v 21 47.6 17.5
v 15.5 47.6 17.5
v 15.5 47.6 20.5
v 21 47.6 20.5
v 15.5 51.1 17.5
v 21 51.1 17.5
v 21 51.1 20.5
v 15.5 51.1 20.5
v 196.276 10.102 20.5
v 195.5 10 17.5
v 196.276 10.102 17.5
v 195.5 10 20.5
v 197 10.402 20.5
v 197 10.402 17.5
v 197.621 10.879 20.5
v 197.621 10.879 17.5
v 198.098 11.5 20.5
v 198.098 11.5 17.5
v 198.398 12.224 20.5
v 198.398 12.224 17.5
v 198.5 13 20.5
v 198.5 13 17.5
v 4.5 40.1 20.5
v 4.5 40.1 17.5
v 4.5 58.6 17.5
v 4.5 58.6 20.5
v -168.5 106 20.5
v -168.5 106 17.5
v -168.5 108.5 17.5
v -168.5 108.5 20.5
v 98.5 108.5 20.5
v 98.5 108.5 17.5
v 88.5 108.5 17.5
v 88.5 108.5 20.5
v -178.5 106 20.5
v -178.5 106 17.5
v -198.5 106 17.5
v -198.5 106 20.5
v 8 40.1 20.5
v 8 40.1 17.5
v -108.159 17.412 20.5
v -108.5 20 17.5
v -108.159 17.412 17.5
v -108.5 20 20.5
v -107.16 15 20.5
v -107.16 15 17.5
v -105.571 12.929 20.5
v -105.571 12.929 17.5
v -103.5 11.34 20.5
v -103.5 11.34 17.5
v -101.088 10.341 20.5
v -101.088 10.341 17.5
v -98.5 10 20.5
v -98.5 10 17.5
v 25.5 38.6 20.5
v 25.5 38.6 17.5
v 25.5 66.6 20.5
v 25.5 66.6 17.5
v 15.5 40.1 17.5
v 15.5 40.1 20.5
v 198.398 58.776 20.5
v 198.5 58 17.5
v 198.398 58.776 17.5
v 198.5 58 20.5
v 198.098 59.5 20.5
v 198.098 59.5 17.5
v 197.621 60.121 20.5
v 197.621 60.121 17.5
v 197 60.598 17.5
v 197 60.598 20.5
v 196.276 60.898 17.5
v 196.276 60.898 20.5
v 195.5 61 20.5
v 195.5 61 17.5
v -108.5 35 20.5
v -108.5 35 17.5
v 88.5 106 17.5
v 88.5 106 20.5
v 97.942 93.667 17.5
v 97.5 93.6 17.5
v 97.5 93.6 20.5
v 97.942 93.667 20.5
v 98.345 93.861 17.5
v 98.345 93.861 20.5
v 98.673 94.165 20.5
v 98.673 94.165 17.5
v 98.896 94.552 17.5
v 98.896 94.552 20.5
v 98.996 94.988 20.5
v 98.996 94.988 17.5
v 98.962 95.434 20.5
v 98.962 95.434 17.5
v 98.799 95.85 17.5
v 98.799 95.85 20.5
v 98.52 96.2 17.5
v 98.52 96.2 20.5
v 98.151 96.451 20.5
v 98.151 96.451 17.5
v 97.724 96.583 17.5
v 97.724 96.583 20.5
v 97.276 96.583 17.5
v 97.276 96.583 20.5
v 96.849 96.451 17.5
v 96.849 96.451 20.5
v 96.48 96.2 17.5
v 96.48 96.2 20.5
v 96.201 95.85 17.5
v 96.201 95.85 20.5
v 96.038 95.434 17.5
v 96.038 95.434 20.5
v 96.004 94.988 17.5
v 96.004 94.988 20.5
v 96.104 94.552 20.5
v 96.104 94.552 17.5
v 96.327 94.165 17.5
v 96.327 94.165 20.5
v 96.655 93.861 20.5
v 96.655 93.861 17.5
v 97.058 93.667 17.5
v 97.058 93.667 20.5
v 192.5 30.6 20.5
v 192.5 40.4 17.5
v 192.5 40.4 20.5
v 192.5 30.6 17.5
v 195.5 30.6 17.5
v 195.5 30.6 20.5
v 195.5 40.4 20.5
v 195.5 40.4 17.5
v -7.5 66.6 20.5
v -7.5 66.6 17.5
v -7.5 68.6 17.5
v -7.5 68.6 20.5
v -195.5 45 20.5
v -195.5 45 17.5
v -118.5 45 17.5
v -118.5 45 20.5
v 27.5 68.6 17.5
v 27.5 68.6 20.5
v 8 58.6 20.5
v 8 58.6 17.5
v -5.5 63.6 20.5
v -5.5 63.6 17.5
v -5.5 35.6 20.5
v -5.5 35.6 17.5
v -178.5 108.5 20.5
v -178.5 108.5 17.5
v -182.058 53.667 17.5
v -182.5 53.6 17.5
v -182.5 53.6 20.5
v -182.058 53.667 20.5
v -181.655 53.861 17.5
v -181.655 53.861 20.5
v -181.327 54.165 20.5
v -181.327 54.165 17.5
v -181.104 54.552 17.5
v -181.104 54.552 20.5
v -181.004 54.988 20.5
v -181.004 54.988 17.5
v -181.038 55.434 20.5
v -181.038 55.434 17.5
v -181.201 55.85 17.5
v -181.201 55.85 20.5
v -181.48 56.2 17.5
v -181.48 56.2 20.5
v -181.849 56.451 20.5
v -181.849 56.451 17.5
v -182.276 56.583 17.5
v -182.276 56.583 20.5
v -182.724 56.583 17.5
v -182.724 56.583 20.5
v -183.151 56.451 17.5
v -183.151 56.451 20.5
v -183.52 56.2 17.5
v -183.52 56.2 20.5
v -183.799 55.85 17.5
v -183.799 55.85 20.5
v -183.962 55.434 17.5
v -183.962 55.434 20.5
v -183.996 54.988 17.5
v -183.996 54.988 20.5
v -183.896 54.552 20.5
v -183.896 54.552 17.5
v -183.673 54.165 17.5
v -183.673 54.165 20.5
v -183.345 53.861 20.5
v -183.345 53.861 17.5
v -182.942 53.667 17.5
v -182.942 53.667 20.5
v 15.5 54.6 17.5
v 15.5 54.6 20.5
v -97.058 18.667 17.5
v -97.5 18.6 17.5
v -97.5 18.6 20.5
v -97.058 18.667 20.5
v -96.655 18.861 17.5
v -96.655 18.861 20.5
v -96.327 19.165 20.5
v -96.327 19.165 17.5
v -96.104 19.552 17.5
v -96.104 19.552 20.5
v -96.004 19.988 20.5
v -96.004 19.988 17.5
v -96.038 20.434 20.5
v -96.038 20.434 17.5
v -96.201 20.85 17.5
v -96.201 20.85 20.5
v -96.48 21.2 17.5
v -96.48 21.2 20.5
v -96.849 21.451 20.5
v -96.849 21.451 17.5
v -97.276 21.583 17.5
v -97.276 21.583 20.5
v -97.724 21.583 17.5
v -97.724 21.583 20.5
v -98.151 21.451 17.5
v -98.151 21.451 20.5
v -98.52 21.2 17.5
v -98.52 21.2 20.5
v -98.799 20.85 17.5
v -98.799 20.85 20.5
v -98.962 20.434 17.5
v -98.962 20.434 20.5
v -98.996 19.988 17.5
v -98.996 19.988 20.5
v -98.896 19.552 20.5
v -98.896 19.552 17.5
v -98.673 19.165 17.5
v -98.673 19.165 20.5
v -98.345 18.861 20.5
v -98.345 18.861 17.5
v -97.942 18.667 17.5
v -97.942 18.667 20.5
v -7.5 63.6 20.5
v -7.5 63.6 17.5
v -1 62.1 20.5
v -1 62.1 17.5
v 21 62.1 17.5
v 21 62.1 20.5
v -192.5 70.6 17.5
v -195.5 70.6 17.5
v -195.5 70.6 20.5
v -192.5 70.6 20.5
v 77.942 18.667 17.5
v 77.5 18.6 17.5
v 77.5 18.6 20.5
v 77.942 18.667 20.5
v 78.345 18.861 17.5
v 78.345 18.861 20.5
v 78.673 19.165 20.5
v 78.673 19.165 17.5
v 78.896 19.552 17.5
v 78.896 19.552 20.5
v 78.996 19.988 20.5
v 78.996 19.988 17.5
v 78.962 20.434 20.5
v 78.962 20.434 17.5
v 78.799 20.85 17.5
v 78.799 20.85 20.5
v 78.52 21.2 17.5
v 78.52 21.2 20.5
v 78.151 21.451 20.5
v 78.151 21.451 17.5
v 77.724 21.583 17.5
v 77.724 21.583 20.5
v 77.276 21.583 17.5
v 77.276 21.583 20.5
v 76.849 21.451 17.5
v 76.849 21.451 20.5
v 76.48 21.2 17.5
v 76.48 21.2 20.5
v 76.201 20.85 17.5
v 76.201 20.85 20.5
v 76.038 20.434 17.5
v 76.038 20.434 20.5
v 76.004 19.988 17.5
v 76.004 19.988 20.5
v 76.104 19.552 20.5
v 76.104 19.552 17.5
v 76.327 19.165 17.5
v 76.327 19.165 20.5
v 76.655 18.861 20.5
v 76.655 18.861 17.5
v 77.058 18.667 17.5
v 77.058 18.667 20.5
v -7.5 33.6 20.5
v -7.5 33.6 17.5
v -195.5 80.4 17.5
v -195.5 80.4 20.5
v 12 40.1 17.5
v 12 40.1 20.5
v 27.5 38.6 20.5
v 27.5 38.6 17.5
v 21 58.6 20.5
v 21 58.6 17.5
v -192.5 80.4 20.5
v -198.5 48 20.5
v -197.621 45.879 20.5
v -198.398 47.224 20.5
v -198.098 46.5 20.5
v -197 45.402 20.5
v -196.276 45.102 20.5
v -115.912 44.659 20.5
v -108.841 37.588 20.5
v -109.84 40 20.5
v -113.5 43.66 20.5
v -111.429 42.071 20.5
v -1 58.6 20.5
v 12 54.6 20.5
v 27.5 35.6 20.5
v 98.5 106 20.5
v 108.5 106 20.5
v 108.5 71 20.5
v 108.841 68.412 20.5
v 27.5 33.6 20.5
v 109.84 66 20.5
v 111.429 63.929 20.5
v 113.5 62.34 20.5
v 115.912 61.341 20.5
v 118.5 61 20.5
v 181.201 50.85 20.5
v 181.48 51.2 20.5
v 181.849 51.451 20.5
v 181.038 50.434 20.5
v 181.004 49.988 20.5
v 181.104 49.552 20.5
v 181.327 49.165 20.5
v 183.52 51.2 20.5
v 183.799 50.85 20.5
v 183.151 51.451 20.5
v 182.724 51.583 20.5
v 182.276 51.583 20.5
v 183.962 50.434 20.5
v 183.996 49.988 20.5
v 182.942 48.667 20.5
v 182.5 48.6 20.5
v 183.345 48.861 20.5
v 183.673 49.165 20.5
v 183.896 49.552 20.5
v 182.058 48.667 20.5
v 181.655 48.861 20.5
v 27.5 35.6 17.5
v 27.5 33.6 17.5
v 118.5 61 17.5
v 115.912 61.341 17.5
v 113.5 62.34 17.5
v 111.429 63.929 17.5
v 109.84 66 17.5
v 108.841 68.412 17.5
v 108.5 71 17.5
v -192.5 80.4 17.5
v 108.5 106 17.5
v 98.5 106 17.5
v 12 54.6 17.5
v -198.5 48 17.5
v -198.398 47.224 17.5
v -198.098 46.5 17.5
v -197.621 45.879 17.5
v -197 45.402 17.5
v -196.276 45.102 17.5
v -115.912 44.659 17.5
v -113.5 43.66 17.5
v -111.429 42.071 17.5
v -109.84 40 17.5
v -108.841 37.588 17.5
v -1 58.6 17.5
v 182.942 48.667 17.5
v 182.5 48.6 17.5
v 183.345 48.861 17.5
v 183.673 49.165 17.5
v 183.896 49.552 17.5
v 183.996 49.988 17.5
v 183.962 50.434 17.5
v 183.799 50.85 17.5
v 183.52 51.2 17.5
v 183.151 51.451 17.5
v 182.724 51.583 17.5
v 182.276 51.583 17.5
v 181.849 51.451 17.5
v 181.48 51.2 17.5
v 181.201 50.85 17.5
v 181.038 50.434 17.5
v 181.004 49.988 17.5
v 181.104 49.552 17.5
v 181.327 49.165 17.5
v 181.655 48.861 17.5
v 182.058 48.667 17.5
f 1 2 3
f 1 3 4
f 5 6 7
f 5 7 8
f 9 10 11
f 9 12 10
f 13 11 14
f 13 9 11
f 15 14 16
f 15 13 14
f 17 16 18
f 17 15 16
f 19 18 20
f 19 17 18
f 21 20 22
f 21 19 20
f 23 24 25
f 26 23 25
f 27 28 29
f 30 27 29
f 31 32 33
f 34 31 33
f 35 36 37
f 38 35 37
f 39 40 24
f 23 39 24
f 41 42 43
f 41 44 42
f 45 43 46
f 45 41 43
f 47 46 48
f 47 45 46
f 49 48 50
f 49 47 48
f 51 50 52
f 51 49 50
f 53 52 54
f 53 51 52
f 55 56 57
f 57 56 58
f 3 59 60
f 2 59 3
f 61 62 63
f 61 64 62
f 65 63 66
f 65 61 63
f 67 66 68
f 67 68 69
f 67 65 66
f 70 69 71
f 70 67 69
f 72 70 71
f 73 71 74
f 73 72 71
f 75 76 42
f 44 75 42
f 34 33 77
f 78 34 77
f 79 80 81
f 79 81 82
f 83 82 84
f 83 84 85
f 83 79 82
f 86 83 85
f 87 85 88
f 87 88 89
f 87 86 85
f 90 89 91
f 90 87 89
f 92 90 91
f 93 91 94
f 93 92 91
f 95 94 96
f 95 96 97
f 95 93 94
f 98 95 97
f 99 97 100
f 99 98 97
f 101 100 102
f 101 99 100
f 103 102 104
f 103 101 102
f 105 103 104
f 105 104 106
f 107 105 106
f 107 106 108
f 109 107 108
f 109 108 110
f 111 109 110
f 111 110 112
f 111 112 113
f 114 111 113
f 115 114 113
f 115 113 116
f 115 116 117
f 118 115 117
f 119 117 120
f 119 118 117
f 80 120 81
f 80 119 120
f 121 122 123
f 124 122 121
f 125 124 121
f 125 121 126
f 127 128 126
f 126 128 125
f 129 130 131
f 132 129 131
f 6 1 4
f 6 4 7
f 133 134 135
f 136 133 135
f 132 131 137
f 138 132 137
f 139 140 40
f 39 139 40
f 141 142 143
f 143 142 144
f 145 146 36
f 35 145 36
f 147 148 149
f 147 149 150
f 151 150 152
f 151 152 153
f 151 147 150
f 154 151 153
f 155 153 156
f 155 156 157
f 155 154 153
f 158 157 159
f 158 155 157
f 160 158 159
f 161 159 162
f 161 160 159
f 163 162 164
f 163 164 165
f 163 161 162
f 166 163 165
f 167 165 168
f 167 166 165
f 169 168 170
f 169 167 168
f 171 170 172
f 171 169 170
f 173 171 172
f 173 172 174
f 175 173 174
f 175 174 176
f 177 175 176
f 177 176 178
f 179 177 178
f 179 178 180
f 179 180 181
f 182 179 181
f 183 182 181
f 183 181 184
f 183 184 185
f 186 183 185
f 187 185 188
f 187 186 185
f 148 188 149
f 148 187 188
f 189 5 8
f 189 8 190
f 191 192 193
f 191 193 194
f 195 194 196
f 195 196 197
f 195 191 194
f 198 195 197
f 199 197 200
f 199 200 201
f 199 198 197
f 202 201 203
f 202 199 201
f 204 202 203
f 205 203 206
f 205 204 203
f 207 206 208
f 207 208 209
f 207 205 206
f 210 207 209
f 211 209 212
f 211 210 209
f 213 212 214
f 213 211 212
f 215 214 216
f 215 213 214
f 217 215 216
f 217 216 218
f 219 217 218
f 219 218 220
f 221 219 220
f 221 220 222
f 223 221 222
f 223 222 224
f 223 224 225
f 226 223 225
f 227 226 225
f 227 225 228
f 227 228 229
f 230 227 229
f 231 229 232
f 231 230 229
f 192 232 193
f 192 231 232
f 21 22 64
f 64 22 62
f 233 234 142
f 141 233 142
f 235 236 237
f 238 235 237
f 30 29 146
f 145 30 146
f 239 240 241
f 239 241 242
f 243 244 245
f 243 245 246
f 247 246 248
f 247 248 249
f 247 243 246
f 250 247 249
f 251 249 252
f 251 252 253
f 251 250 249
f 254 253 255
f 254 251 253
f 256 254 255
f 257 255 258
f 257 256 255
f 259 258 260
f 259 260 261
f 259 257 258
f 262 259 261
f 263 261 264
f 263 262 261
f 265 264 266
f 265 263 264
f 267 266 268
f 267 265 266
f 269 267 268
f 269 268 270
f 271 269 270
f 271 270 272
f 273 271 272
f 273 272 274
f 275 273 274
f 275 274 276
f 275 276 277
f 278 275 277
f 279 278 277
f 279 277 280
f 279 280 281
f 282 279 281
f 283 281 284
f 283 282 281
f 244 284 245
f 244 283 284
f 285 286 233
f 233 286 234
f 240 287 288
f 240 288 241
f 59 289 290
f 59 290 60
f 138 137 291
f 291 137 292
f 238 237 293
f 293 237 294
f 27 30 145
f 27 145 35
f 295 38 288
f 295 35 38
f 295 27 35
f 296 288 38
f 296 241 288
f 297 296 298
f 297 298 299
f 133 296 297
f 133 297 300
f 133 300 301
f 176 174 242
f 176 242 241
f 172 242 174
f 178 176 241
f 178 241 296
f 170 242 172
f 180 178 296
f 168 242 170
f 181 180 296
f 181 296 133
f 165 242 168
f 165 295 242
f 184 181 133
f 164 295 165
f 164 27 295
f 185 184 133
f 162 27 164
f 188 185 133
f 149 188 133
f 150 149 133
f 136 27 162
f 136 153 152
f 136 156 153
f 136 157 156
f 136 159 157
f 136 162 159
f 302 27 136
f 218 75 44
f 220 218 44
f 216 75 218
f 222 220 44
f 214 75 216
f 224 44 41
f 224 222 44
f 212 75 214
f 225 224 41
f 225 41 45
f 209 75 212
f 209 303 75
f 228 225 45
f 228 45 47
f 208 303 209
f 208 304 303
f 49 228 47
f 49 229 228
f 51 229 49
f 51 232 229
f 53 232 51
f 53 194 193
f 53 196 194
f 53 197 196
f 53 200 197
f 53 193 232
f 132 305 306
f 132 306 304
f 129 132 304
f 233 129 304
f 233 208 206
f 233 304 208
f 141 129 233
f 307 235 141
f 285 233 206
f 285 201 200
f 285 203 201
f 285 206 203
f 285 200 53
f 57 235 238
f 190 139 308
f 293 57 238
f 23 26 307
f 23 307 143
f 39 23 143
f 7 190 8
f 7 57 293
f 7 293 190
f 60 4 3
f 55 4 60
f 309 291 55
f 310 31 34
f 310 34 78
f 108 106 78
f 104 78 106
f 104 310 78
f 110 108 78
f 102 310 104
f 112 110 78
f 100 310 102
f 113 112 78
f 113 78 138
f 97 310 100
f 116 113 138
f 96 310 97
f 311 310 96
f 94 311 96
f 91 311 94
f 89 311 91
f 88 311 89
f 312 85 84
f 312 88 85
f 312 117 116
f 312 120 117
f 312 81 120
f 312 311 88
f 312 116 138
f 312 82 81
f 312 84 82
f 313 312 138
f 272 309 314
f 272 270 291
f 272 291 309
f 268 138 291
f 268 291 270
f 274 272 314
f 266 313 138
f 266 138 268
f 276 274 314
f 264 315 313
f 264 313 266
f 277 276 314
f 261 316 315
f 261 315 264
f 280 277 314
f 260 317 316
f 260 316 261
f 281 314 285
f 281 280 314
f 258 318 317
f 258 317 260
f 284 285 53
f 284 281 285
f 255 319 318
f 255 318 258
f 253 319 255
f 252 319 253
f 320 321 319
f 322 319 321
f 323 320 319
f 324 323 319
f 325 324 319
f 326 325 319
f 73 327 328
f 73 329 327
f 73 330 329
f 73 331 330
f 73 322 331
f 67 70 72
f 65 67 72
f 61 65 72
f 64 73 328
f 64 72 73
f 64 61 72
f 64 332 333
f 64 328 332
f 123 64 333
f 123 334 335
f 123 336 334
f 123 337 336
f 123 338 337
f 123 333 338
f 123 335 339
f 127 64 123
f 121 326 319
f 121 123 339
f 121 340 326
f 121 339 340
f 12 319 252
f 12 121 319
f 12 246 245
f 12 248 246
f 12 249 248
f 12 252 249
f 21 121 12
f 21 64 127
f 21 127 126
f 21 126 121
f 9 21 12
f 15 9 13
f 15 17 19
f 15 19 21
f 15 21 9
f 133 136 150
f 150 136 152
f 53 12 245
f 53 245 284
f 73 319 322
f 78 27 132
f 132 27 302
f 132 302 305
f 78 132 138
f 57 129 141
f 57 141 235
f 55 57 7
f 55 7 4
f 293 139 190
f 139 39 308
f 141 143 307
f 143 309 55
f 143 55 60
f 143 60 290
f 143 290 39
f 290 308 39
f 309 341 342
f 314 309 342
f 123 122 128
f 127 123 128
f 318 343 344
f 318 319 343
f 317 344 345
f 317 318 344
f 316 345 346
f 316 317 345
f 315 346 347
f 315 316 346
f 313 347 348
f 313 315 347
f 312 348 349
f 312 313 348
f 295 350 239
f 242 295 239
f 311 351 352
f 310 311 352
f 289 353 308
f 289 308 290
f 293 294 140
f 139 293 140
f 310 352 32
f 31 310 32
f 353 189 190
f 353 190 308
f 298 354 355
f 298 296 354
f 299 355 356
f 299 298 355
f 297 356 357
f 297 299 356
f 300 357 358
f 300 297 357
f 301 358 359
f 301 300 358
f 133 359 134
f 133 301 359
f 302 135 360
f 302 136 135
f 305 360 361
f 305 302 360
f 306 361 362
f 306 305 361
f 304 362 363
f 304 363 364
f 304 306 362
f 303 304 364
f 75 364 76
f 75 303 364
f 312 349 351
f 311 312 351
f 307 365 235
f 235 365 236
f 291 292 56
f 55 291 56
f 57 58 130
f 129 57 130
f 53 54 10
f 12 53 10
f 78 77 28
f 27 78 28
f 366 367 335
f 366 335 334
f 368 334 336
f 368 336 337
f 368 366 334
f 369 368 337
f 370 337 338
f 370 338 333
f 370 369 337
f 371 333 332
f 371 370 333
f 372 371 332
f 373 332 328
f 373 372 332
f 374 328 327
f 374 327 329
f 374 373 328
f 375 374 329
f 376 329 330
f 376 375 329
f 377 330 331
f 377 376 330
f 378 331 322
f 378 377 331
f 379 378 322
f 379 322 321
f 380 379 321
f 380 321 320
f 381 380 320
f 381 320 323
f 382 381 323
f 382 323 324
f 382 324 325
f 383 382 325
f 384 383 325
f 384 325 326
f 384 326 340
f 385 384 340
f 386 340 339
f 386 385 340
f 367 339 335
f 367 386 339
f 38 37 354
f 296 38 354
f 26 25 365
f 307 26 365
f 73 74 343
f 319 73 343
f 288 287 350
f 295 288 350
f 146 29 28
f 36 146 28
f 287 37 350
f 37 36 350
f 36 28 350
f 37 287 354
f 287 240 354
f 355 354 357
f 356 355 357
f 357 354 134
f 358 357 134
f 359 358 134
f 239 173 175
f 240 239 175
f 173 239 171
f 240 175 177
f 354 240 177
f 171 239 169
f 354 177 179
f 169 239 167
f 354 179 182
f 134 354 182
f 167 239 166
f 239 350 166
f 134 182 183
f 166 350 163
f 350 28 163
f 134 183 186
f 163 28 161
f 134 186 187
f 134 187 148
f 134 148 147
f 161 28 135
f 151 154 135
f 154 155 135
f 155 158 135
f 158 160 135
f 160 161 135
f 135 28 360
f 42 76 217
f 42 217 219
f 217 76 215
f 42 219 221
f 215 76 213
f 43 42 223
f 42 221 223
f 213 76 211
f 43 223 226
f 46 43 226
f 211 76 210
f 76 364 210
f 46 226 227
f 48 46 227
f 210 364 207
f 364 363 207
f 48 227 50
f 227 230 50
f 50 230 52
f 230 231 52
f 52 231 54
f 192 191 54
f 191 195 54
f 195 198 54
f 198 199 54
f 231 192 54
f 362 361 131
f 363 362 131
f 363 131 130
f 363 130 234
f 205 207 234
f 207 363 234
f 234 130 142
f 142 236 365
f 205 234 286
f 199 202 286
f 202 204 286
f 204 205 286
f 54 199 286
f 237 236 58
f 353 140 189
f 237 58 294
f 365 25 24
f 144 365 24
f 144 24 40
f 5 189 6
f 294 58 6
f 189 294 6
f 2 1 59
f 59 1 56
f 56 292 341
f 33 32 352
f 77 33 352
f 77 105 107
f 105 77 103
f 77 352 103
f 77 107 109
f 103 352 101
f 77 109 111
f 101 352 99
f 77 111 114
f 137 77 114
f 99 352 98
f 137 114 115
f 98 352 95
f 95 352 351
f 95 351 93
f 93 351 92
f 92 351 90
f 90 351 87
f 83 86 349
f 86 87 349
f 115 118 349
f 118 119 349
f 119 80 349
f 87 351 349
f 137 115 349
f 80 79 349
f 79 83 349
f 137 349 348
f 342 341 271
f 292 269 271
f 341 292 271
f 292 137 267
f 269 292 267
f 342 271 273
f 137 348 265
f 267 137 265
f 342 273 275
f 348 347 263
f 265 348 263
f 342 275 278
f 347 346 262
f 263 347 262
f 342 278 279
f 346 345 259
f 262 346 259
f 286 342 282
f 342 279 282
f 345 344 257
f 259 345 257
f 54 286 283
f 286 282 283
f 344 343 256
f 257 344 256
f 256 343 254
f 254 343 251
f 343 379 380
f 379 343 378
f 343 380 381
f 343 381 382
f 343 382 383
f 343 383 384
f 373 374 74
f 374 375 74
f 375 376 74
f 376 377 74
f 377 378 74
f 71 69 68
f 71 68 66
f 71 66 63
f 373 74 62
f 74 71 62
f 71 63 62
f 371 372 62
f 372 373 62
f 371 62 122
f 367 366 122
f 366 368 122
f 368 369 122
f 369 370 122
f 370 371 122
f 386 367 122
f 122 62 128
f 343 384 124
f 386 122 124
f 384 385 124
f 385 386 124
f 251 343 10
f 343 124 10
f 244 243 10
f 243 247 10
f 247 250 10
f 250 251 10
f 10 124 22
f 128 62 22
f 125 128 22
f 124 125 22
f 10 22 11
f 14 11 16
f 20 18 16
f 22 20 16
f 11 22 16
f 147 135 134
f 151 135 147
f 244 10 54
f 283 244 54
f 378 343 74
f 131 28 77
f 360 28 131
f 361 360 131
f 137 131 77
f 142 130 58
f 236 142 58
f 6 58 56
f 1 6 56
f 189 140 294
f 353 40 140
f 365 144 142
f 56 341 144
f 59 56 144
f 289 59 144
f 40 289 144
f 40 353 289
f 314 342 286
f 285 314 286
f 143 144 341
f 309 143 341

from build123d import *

# Parameters (mm, degrees)
SKETCH001002018_R = 1.5
SKETCH001002018_W = 9.8
SKETCH001002018_H = 3
PAD020_DEPTH      = 3
FILLET031_R       = 3
FILLET032_R       = 10


with BuildPart() as part:
    # Sketch001002018 → Pad020 (new body)
    with BuildSketch(Plane(origin=(0, 45, 17.5), x_dir=(0, -1, 0), z_dir=(0, 0, 1))):
        Polygon((-61, -198.5), (0, -198.5), (0, -108.5), (35, -108.5), (35, 198.5), (-16, 198.5), (-16, 108.5), (-61, 108.5), (-61, 98.5), (-63.5, 98.5), (-63.5, 88.5), (-61, 88.5), (-61, -168.5), (-63.5, -168.5), (-63.5, -178.5), (-61, -178.5), align=None)
        with Locations((-50.1, 97.5)):
            Circle(SKETCH001002018_R, mode=Mode.SUBTRACT)
        with Locations((-5.1, 182.5)):
            Circle(SKETCH001002018_R, mode=Mode.SUBTRACT)
        with Locations((24.9, 77.5)):
            Circle(SKETCH001002018_R, mode=Mode.SUBTRACT)
        with Locations((-10.1, -182.5)):
            Circle(SKETCH001002018_R, mode=Mode.SUBTRACT)
        with Locations((24.9, -97.5)):
            Circle(SKETCH001002018_R, mode=Mode.SUBTRACT)
        with Locations((-30.5, -194)):
            Rectangle(SKETCH001002018_W, SKETCH001002018_H, mode=Mode.SUBTRACT)
        with Locations((9.5, 194)):
            Rectangle(SKETCH001002018_W, SKETCH001002018_H, mode=Mode.SUBTRACT)
        Polygon((-18.6, -7.5), (-18.6, -5.5), (9.4, -5.5), (9.4, 27.5), (11.4, 27.5), (11.4, -7.5), align=None, mode=Mode.SUBTRACT)
        Polygon((-21.6, -7.5), (-23.6, -7.5), (-23.6, 27.5), (6.4, 27.5), (6.4, 25.5), (-21.6, 25.5), align=None, mode=Mode.SUBTRACT)
        Polygon((-13.6, -1), (-17.1, -1), (-17.1, 21), (-13.6, 21), (-13.6, 8), (4.9, 8), (4.9, 4.5), (-13.6, 4.5), align=None, mode=Mode.SUBTRACT)
        Polygon((-9.6, 12), (4.9, 12), (4.9, 15.5), (-2.6, 15.5), (-2.6, 21), (-6.1, 21), (-6.1, 15.5), (-9.6, 15.5), align=None, mode=Mode.SUBTRACT)
    extrude(amount=PAD020_DEPTH)

    # Fillet031
    fillet031_edges = [part.edges().sort_by_distance(p)[0] for p in [
        (-198.5, 45, 19),
        (198.5, 10, 19),
        (198.5, 61, 19),
    ]]
    fillet(fillet031_edges, radius=FILLET031_R)

    # Fillet032
    fillet032_edges = [part.edges().sort_by_distance(p)[0] for p in [
        (-108.5, 45, 19),
        (-108.5, 10, 19),
        (108.5, 61, 19),
    ]]
    fillet(fillet032_edges, radius=FILLET032_R)


solid = part.part
